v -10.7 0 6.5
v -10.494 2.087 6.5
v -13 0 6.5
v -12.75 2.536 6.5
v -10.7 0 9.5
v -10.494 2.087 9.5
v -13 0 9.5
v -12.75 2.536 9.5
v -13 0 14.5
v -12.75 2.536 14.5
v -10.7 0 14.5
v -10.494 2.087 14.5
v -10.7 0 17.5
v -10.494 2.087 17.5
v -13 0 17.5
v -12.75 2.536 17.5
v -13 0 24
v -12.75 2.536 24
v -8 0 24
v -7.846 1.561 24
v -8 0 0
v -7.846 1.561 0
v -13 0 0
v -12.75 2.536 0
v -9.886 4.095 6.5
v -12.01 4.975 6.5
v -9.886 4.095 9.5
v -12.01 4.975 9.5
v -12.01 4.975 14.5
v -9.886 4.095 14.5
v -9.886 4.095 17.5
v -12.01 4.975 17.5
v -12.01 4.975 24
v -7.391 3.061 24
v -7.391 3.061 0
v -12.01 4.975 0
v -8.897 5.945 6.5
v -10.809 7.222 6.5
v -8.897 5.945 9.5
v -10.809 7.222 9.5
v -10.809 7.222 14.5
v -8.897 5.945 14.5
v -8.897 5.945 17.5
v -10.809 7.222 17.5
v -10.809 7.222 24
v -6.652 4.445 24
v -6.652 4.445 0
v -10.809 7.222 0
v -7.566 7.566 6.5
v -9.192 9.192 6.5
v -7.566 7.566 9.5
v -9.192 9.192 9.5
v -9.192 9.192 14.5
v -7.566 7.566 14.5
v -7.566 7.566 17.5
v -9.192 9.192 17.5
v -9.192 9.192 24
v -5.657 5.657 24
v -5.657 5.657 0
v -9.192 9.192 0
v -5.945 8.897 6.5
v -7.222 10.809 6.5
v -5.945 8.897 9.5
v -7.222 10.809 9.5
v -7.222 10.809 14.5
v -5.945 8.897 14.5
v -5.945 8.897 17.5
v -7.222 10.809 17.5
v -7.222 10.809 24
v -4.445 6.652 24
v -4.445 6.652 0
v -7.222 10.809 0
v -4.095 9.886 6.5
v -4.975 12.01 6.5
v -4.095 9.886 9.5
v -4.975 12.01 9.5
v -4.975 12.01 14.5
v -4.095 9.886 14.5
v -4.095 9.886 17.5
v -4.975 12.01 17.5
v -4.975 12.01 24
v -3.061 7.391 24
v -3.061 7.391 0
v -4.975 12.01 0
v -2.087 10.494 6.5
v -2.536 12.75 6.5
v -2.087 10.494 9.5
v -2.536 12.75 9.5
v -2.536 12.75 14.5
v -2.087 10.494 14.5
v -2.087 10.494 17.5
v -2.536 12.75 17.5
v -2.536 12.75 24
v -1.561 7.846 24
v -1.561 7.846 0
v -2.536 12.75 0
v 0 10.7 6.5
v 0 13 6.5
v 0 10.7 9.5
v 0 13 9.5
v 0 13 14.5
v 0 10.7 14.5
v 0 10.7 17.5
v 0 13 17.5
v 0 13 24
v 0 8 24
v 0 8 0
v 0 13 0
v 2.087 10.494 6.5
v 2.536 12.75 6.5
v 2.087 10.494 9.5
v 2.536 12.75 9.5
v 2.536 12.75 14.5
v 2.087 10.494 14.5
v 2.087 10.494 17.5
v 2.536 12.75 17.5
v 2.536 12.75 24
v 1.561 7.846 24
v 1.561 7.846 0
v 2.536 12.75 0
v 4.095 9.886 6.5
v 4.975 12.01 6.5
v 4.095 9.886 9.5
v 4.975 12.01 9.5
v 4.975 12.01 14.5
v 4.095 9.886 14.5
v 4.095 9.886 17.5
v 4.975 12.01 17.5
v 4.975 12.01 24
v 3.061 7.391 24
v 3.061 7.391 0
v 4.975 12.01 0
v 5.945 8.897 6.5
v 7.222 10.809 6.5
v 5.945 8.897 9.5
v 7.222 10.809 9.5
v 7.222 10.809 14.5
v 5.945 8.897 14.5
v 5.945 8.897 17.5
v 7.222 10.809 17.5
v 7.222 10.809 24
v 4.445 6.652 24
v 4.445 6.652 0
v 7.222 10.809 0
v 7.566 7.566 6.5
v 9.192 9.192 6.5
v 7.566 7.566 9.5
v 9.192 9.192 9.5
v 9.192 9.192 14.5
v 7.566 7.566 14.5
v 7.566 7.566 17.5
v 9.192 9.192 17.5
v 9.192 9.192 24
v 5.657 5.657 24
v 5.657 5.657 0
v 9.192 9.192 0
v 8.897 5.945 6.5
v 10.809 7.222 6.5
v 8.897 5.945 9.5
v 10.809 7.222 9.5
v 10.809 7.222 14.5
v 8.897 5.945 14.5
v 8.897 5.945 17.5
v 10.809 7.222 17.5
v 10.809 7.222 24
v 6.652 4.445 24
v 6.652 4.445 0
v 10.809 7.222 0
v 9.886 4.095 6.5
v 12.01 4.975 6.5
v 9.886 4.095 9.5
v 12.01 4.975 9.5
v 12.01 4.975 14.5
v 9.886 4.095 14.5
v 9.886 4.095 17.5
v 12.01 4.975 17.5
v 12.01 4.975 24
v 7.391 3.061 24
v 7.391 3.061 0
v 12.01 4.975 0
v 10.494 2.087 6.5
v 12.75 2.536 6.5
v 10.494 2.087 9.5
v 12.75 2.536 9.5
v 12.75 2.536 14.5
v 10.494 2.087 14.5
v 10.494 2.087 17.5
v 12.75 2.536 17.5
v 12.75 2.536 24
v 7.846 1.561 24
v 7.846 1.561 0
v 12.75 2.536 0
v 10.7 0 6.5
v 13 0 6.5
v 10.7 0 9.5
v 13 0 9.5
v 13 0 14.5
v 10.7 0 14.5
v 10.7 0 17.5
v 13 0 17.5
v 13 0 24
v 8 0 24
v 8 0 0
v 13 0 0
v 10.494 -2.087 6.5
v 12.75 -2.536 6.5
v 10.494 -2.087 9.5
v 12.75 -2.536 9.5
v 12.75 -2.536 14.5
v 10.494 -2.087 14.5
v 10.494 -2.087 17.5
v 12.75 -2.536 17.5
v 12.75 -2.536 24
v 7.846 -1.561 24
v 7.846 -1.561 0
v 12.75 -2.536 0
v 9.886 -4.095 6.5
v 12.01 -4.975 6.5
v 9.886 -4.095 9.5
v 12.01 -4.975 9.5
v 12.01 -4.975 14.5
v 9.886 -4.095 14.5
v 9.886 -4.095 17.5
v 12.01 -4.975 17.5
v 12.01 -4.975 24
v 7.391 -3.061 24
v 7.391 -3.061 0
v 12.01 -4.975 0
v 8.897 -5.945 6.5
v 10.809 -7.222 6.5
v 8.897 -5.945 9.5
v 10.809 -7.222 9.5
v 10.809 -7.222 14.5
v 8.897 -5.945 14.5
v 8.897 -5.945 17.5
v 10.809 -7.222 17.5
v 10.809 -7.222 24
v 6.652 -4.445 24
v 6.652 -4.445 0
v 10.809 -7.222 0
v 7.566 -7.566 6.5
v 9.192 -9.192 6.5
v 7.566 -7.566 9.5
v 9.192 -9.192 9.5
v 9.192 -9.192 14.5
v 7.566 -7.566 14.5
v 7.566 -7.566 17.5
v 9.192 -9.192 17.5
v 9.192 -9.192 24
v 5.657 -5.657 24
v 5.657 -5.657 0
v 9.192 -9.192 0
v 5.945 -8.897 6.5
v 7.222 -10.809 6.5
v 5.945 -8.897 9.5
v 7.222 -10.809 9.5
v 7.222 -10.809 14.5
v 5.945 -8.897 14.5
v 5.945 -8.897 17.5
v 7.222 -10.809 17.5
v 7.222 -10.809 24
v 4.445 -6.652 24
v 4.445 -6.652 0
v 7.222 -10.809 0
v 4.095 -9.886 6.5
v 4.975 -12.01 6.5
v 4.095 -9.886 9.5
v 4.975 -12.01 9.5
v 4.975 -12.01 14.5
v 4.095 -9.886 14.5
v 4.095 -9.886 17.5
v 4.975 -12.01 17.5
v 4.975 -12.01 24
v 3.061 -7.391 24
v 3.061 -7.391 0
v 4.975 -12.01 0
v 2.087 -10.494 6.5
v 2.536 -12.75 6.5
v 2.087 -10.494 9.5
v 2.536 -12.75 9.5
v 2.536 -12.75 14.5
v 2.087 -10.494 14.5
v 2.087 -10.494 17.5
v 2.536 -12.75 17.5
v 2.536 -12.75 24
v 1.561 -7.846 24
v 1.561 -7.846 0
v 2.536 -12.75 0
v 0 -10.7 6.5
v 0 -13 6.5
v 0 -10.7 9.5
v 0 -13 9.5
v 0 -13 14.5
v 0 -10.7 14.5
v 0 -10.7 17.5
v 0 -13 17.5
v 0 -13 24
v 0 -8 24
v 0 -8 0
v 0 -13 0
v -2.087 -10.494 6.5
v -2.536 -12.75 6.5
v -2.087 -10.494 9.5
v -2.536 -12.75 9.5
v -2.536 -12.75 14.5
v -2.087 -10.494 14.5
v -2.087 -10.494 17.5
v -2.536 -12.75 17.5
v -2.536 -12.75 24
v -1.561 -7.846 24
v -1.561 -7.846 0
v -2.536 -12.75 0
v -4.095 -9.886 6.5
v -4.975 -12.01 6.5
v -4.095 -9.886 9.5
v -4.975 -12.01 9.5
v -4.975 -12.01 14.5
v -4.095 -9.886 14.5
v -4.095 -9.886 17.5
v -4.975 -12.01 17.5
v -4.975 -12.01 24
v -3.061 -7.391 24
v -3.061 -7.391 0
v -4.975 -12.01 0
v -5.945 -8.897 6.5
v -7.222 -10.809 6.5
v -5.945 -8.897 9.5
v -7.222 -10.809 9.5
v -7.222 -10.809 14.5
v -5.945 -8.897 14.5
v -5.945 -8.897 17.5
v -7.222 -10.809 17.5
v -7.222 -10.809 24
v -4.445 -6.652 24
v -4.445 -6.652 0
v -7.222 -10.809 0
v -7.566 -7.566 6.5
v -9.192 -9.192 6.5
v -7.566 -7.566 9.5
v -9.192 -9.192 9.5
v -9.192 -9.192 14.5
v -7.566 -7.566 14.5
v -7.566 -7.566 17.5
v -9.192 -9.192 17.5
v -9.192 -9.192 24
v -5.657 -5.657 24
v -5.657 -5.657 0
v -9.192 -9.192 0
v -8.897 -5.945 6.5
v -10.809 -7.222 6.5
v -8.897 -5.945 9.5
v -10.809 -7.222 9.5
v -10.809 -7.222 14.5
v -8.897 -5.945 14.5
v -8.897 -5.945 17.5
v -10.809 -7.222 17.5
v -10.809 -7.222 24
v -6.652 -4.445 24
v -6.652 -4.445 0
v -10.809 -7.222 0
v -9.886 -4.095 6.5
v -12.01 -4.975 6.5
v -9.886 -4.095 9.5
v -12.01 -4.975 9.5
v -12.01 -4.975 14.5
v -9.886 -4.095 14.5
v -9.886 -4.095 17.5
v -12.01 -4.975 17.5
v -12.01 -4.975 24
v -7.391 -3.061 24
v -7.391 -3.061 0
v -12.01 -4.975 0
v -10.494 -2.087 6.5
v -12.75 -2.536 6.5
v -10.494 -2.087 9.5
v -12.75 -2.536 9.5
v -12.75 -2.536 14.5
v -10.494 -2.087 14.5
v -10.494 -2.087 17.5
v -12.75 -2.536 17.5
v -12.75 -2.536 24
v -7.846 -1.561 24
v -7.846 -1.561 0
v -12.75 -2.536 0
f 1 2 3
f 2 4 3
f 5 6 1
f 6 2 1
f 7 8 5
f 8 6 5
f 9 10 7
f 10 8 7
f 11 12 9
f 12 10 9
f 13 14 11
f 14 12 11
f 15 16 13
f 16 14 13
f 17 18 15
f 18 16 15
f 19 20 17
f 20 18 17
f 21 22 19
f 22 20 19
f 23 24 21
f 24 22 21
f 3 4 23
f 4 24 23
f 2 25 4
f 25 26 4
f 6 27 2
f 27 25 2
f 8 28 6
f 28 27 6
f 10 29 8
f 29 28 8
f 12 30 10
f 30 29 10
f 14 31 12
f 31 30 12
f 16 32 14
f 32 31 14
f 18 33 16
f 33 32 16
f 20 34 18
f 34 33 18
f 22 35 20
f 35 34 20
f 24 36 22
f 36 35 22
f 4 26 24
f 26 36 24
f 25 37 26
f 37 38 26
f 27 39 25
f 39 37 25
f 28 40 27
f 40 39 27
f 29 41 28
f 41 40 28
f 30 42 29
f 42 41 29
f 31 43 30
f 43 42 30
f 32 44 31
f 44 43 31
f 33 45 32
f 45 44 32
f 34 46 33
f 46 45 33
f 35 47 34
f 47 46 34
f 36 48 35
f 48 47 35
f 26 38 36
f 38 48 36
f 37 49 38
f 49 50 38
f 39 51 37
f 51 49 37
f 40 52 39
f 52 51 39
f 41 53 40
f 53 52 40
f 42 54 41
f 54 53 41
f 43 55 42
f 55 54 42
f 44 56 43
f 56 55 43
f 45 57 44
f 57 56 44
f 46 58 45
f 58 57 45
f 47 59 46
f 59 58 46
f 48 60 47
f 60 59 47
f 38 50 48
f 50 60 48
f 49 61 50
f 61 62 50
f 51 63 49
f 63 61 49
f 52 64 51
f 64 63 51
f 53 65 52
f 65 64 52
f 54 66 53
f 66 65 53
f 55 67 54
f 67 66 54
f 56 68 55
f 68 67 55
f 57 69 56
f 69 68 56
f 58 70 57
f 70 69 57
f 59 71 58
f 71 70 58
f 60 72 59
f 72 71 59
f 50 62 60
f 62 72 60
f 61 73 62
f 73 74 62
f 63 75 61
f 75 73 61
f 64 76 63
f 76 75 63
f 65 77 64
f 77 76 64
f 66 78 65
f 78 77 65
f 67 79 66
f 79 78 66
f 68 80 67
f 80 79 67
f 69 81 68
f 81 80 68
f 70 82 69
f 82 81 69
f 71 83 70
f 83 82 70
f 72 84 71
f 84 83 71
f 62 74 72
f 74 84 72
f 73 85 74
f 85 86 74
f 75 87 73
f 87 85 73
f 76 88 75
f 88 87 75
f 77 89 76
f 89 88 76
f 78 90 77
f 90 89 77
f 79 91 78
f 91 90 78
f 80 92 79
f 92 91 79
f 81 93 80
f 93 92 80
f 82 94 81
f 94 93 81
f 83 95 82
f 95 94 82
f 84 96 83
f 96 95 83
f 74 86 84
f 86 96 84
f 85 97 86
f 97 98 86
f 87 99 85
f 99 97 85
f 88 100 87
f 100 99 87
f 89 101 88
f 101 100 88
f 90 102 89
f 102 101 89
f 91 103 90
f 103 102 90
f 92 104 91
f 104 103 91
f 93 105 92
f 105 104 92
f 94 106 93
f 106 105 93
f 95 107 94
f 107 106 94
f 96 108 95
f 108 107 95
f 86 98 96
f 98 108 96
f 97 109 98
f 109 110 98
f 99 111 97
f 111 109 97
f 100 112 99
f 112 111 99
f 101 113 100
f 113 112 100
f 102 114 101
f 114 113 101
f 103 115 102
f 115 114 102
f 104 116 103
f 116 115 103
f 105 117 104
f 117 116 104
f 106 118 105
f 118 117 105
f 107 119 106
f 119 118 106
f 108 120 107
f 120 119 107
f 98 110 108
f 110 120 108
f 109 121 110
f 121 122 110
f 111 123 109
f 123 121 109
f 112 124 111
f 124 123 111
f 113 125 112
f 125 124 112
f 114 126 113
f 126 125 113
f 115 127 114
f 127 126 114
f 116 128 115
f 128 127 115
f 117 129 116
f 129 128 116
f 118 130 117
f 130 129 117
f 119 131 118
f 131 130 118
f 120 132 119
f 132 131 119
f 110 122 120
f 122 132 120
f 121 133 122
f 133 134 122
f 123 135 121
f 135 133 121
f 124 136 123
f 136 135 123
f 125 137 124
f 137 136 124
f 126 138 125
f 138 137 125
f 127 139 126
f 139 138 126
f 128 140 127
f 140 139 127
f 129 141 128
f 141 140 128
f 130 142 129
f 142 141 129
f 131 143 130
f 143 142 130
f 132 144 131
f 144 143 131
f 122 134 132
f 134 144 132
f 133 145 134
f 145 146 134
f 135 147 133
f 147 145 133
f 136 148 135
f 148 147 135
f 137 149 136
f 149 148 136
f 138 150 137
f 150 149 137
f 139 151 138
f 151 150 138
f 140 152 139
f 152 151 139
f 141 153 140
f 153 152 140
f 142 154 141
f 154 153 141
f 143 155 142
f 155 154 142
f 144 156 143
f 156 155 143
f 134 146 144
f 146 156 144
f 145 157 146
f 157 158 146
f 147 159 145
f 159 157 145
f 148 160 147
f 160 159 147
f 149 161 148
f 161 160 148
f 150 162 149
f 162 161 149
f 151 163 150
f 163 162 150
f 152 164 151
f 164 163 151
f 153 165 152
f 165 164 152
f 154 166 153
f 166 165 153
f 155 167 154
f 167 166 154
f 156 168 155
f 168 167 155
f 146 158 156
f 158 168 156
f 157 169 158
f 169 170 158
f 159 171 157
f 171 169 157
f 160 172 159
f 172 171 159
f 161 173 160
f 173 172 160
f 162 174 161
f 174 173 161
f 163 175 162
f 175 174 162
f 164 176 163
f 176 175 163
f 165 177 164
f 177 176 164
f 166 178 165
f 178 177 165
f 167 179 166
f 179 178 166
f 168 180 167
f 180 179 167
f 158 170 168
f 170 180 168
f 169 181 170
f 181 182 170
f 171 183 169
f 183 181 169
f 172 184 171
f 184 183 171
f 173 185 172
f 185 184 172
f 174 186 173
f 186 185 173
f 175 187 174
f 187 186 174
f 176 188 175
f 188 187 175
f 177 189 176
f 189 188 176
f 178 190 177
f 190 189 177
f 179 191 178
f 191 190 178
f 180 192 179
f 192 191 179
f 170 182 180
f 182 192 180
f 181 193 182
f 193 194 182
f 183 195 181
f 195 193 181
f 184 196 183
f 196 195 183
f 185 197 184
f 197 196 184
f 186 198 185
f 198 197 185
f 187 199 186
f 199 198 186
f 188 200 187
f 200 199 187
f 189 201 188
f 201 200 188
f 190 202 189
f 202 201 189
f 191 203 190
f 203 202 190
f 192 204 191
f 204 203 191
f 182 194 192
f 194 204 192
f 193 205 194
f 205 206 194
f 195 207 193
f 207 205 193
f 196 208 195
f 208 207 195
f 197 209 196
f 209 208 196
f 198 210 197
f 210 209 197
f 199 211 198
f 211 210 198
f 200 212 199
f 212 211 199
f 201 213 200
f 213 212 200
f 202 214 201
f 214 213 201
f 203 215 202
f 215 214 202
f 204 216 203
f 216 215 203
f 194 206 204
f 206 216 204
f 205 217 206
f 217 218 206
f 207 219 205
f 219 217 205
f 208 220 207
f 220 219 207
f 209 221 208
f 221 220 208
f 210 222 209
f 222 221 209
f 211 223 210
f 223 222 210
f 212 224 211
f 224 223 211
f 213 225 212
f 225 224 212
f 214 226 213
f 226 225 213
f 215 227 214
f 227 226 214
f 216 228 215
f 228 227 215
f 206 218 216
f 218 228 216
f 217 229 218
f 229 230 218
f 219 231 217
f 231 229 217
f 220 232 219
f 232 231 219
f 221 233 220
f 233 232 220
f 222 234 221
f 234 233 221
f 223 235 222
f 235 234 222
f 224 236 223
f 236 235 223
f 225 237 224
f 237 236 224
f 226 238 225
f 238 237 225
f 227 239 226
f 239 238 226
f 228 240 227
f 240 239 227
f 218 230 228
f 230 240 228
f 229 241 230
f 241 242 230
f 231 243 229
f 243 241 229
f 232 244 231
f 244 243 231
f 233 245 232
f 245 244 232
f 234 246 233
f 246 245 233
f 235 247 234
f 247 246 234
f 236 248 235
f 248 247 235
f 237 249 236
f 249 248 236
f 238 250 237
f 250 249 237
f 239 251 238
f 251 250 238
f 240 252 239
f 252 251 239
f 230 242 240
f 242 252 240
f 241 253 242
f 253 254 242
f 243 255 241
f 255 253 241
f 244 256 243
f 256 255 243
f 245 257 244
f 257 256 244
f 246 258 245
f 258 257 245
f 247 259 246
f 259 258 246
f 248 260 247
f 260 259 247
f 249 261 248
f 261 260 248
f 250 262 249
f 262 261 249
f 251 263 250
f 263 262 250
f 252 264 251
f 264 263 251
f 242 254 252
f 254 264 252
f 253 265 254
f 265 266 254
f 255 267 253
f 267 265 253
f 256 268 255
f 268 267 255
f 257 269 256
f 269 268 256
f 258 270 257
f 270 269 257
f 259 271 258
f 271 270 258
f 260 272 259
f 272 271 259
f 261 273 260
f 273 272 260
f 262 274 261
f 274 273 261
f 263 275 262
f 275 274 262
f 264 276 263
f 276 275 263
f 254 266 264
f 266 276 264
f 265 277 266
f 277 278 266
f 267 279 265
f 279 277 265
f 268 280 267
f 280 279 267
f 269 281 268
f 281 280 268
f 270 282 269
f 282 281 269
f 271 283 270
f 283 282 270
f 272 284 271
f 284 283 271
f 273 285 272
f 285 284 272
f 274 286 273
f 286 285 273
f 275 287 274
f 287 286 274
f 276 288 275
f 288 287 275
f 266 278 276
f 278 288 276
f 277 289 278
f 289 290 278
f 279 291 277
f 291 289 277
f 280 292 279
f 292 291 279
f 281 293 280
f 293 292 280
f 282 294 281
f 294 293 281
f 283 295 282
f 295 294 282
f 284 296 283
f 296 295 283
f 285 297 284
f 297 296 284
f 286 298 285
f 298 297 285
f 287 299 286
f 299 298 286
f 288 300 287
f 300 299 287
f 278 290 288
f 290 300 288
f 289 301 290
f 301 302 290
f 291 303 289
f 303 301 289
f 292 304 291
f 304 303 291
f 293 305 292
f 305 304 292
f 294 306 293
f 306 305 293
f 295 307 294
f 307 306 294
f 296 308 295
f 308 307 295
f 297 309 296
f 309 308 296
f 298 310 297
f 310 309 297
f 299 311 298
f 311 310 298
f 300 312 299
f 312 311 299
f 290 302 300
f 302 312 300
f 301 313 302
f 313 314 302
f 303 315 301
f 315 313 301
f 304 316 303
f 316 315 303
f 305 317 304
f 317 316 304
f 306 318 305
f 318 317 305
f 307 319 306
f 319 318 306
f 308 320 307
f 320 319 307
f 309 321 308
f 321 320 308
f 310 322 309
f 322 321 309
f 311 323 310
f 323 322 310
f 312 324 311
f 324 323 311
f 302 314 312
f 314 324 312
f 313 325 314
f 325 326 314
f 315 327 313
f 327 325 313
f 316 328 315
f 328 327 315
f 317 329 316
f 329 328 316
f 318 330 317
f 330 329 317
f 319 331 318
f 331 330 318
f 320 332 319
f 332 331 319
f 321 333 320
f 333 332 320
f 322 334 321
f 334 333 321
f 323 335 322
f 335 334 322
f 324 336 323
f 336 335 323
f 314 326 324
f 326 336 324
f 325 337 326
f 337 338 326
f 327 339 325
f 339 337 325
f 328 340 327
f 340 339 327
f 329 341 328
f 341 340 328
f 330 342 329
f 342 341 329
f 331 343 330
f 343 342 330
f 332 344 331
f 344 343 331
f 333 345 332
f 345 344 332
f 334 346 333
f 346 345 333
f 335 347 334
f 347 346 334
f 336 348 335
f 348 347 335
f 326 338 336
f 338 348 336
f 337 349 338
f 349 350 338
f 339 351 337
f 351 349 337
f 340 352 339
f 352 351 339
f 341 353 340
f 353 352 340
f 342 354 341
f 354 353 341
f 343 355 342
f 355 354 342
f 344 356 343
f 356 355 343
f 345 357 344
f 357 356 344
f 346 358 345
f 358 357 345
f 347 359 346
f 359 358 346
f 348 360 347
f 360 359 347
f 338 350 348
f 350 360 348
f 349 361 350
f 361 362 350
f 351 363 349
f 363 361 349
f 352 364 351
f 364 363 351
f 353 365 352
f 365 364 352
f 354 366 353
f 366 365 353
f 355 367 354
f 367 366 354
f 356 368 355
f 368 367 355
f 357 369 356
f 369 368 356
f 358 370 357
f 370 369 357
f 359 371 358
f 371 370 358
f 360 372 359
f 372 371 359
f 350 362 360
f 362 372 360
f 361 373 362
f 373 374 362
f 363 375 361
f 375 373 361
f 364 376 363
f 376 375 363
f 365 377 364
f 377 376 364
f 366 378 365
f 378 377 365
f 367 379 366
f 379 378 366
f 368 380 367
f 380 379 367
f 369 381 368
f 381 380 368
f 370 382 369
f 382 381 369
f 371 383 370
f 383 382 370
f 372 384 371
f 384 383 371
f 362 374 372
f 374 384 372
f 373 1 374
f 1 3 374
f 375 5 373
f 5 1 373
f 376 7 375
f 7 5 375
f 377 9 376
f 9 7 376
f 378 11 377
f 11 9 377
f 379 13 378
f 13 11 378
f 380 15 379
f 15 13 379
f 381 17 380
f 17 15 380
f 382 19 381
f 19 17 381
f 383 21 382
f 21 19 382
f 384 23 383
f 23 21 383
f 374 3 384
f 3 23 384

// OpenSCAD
$fn = 32;

// ----------------------------------------------------------------------
// Grooved revolve: plain_grooves, bore R8
// ----------------------------------------------------------------------

// --- parameters (mm) ---
bore_r = 8;               // bore radius
outer_r = 13;             // outer radius of the body
total_h = 24;             // overall height, Z
wall = 5;                 // radial wall thickness
groove_w = 3;             // groove width
groove_d = 2.3;           // groove depth
grooves = 2;              // number of outer grooves

bbox_x = 2 * outer_r;  // full diameter
bore_d = 2 * bore_r;  // bore diameter
body_d = 2 * outer_r;  // body diameter
revolve_angle = 360;  // full turn around the Z axis

profile = [[8, 0], [13, 0], [13, 6.5], [10.7, 6.5], [10.7, 9.5], [13, 9.5], [13, 14.5], [10.7, 14.5], [10.7, 17.5], [13, 17.5], [13, 24], [8, 24]];  // primary outline, 12 points, counter clockwise

// --- the one profile operation ---
rotate_extrude(angle = revolve_angle) polygon(points = profile);
